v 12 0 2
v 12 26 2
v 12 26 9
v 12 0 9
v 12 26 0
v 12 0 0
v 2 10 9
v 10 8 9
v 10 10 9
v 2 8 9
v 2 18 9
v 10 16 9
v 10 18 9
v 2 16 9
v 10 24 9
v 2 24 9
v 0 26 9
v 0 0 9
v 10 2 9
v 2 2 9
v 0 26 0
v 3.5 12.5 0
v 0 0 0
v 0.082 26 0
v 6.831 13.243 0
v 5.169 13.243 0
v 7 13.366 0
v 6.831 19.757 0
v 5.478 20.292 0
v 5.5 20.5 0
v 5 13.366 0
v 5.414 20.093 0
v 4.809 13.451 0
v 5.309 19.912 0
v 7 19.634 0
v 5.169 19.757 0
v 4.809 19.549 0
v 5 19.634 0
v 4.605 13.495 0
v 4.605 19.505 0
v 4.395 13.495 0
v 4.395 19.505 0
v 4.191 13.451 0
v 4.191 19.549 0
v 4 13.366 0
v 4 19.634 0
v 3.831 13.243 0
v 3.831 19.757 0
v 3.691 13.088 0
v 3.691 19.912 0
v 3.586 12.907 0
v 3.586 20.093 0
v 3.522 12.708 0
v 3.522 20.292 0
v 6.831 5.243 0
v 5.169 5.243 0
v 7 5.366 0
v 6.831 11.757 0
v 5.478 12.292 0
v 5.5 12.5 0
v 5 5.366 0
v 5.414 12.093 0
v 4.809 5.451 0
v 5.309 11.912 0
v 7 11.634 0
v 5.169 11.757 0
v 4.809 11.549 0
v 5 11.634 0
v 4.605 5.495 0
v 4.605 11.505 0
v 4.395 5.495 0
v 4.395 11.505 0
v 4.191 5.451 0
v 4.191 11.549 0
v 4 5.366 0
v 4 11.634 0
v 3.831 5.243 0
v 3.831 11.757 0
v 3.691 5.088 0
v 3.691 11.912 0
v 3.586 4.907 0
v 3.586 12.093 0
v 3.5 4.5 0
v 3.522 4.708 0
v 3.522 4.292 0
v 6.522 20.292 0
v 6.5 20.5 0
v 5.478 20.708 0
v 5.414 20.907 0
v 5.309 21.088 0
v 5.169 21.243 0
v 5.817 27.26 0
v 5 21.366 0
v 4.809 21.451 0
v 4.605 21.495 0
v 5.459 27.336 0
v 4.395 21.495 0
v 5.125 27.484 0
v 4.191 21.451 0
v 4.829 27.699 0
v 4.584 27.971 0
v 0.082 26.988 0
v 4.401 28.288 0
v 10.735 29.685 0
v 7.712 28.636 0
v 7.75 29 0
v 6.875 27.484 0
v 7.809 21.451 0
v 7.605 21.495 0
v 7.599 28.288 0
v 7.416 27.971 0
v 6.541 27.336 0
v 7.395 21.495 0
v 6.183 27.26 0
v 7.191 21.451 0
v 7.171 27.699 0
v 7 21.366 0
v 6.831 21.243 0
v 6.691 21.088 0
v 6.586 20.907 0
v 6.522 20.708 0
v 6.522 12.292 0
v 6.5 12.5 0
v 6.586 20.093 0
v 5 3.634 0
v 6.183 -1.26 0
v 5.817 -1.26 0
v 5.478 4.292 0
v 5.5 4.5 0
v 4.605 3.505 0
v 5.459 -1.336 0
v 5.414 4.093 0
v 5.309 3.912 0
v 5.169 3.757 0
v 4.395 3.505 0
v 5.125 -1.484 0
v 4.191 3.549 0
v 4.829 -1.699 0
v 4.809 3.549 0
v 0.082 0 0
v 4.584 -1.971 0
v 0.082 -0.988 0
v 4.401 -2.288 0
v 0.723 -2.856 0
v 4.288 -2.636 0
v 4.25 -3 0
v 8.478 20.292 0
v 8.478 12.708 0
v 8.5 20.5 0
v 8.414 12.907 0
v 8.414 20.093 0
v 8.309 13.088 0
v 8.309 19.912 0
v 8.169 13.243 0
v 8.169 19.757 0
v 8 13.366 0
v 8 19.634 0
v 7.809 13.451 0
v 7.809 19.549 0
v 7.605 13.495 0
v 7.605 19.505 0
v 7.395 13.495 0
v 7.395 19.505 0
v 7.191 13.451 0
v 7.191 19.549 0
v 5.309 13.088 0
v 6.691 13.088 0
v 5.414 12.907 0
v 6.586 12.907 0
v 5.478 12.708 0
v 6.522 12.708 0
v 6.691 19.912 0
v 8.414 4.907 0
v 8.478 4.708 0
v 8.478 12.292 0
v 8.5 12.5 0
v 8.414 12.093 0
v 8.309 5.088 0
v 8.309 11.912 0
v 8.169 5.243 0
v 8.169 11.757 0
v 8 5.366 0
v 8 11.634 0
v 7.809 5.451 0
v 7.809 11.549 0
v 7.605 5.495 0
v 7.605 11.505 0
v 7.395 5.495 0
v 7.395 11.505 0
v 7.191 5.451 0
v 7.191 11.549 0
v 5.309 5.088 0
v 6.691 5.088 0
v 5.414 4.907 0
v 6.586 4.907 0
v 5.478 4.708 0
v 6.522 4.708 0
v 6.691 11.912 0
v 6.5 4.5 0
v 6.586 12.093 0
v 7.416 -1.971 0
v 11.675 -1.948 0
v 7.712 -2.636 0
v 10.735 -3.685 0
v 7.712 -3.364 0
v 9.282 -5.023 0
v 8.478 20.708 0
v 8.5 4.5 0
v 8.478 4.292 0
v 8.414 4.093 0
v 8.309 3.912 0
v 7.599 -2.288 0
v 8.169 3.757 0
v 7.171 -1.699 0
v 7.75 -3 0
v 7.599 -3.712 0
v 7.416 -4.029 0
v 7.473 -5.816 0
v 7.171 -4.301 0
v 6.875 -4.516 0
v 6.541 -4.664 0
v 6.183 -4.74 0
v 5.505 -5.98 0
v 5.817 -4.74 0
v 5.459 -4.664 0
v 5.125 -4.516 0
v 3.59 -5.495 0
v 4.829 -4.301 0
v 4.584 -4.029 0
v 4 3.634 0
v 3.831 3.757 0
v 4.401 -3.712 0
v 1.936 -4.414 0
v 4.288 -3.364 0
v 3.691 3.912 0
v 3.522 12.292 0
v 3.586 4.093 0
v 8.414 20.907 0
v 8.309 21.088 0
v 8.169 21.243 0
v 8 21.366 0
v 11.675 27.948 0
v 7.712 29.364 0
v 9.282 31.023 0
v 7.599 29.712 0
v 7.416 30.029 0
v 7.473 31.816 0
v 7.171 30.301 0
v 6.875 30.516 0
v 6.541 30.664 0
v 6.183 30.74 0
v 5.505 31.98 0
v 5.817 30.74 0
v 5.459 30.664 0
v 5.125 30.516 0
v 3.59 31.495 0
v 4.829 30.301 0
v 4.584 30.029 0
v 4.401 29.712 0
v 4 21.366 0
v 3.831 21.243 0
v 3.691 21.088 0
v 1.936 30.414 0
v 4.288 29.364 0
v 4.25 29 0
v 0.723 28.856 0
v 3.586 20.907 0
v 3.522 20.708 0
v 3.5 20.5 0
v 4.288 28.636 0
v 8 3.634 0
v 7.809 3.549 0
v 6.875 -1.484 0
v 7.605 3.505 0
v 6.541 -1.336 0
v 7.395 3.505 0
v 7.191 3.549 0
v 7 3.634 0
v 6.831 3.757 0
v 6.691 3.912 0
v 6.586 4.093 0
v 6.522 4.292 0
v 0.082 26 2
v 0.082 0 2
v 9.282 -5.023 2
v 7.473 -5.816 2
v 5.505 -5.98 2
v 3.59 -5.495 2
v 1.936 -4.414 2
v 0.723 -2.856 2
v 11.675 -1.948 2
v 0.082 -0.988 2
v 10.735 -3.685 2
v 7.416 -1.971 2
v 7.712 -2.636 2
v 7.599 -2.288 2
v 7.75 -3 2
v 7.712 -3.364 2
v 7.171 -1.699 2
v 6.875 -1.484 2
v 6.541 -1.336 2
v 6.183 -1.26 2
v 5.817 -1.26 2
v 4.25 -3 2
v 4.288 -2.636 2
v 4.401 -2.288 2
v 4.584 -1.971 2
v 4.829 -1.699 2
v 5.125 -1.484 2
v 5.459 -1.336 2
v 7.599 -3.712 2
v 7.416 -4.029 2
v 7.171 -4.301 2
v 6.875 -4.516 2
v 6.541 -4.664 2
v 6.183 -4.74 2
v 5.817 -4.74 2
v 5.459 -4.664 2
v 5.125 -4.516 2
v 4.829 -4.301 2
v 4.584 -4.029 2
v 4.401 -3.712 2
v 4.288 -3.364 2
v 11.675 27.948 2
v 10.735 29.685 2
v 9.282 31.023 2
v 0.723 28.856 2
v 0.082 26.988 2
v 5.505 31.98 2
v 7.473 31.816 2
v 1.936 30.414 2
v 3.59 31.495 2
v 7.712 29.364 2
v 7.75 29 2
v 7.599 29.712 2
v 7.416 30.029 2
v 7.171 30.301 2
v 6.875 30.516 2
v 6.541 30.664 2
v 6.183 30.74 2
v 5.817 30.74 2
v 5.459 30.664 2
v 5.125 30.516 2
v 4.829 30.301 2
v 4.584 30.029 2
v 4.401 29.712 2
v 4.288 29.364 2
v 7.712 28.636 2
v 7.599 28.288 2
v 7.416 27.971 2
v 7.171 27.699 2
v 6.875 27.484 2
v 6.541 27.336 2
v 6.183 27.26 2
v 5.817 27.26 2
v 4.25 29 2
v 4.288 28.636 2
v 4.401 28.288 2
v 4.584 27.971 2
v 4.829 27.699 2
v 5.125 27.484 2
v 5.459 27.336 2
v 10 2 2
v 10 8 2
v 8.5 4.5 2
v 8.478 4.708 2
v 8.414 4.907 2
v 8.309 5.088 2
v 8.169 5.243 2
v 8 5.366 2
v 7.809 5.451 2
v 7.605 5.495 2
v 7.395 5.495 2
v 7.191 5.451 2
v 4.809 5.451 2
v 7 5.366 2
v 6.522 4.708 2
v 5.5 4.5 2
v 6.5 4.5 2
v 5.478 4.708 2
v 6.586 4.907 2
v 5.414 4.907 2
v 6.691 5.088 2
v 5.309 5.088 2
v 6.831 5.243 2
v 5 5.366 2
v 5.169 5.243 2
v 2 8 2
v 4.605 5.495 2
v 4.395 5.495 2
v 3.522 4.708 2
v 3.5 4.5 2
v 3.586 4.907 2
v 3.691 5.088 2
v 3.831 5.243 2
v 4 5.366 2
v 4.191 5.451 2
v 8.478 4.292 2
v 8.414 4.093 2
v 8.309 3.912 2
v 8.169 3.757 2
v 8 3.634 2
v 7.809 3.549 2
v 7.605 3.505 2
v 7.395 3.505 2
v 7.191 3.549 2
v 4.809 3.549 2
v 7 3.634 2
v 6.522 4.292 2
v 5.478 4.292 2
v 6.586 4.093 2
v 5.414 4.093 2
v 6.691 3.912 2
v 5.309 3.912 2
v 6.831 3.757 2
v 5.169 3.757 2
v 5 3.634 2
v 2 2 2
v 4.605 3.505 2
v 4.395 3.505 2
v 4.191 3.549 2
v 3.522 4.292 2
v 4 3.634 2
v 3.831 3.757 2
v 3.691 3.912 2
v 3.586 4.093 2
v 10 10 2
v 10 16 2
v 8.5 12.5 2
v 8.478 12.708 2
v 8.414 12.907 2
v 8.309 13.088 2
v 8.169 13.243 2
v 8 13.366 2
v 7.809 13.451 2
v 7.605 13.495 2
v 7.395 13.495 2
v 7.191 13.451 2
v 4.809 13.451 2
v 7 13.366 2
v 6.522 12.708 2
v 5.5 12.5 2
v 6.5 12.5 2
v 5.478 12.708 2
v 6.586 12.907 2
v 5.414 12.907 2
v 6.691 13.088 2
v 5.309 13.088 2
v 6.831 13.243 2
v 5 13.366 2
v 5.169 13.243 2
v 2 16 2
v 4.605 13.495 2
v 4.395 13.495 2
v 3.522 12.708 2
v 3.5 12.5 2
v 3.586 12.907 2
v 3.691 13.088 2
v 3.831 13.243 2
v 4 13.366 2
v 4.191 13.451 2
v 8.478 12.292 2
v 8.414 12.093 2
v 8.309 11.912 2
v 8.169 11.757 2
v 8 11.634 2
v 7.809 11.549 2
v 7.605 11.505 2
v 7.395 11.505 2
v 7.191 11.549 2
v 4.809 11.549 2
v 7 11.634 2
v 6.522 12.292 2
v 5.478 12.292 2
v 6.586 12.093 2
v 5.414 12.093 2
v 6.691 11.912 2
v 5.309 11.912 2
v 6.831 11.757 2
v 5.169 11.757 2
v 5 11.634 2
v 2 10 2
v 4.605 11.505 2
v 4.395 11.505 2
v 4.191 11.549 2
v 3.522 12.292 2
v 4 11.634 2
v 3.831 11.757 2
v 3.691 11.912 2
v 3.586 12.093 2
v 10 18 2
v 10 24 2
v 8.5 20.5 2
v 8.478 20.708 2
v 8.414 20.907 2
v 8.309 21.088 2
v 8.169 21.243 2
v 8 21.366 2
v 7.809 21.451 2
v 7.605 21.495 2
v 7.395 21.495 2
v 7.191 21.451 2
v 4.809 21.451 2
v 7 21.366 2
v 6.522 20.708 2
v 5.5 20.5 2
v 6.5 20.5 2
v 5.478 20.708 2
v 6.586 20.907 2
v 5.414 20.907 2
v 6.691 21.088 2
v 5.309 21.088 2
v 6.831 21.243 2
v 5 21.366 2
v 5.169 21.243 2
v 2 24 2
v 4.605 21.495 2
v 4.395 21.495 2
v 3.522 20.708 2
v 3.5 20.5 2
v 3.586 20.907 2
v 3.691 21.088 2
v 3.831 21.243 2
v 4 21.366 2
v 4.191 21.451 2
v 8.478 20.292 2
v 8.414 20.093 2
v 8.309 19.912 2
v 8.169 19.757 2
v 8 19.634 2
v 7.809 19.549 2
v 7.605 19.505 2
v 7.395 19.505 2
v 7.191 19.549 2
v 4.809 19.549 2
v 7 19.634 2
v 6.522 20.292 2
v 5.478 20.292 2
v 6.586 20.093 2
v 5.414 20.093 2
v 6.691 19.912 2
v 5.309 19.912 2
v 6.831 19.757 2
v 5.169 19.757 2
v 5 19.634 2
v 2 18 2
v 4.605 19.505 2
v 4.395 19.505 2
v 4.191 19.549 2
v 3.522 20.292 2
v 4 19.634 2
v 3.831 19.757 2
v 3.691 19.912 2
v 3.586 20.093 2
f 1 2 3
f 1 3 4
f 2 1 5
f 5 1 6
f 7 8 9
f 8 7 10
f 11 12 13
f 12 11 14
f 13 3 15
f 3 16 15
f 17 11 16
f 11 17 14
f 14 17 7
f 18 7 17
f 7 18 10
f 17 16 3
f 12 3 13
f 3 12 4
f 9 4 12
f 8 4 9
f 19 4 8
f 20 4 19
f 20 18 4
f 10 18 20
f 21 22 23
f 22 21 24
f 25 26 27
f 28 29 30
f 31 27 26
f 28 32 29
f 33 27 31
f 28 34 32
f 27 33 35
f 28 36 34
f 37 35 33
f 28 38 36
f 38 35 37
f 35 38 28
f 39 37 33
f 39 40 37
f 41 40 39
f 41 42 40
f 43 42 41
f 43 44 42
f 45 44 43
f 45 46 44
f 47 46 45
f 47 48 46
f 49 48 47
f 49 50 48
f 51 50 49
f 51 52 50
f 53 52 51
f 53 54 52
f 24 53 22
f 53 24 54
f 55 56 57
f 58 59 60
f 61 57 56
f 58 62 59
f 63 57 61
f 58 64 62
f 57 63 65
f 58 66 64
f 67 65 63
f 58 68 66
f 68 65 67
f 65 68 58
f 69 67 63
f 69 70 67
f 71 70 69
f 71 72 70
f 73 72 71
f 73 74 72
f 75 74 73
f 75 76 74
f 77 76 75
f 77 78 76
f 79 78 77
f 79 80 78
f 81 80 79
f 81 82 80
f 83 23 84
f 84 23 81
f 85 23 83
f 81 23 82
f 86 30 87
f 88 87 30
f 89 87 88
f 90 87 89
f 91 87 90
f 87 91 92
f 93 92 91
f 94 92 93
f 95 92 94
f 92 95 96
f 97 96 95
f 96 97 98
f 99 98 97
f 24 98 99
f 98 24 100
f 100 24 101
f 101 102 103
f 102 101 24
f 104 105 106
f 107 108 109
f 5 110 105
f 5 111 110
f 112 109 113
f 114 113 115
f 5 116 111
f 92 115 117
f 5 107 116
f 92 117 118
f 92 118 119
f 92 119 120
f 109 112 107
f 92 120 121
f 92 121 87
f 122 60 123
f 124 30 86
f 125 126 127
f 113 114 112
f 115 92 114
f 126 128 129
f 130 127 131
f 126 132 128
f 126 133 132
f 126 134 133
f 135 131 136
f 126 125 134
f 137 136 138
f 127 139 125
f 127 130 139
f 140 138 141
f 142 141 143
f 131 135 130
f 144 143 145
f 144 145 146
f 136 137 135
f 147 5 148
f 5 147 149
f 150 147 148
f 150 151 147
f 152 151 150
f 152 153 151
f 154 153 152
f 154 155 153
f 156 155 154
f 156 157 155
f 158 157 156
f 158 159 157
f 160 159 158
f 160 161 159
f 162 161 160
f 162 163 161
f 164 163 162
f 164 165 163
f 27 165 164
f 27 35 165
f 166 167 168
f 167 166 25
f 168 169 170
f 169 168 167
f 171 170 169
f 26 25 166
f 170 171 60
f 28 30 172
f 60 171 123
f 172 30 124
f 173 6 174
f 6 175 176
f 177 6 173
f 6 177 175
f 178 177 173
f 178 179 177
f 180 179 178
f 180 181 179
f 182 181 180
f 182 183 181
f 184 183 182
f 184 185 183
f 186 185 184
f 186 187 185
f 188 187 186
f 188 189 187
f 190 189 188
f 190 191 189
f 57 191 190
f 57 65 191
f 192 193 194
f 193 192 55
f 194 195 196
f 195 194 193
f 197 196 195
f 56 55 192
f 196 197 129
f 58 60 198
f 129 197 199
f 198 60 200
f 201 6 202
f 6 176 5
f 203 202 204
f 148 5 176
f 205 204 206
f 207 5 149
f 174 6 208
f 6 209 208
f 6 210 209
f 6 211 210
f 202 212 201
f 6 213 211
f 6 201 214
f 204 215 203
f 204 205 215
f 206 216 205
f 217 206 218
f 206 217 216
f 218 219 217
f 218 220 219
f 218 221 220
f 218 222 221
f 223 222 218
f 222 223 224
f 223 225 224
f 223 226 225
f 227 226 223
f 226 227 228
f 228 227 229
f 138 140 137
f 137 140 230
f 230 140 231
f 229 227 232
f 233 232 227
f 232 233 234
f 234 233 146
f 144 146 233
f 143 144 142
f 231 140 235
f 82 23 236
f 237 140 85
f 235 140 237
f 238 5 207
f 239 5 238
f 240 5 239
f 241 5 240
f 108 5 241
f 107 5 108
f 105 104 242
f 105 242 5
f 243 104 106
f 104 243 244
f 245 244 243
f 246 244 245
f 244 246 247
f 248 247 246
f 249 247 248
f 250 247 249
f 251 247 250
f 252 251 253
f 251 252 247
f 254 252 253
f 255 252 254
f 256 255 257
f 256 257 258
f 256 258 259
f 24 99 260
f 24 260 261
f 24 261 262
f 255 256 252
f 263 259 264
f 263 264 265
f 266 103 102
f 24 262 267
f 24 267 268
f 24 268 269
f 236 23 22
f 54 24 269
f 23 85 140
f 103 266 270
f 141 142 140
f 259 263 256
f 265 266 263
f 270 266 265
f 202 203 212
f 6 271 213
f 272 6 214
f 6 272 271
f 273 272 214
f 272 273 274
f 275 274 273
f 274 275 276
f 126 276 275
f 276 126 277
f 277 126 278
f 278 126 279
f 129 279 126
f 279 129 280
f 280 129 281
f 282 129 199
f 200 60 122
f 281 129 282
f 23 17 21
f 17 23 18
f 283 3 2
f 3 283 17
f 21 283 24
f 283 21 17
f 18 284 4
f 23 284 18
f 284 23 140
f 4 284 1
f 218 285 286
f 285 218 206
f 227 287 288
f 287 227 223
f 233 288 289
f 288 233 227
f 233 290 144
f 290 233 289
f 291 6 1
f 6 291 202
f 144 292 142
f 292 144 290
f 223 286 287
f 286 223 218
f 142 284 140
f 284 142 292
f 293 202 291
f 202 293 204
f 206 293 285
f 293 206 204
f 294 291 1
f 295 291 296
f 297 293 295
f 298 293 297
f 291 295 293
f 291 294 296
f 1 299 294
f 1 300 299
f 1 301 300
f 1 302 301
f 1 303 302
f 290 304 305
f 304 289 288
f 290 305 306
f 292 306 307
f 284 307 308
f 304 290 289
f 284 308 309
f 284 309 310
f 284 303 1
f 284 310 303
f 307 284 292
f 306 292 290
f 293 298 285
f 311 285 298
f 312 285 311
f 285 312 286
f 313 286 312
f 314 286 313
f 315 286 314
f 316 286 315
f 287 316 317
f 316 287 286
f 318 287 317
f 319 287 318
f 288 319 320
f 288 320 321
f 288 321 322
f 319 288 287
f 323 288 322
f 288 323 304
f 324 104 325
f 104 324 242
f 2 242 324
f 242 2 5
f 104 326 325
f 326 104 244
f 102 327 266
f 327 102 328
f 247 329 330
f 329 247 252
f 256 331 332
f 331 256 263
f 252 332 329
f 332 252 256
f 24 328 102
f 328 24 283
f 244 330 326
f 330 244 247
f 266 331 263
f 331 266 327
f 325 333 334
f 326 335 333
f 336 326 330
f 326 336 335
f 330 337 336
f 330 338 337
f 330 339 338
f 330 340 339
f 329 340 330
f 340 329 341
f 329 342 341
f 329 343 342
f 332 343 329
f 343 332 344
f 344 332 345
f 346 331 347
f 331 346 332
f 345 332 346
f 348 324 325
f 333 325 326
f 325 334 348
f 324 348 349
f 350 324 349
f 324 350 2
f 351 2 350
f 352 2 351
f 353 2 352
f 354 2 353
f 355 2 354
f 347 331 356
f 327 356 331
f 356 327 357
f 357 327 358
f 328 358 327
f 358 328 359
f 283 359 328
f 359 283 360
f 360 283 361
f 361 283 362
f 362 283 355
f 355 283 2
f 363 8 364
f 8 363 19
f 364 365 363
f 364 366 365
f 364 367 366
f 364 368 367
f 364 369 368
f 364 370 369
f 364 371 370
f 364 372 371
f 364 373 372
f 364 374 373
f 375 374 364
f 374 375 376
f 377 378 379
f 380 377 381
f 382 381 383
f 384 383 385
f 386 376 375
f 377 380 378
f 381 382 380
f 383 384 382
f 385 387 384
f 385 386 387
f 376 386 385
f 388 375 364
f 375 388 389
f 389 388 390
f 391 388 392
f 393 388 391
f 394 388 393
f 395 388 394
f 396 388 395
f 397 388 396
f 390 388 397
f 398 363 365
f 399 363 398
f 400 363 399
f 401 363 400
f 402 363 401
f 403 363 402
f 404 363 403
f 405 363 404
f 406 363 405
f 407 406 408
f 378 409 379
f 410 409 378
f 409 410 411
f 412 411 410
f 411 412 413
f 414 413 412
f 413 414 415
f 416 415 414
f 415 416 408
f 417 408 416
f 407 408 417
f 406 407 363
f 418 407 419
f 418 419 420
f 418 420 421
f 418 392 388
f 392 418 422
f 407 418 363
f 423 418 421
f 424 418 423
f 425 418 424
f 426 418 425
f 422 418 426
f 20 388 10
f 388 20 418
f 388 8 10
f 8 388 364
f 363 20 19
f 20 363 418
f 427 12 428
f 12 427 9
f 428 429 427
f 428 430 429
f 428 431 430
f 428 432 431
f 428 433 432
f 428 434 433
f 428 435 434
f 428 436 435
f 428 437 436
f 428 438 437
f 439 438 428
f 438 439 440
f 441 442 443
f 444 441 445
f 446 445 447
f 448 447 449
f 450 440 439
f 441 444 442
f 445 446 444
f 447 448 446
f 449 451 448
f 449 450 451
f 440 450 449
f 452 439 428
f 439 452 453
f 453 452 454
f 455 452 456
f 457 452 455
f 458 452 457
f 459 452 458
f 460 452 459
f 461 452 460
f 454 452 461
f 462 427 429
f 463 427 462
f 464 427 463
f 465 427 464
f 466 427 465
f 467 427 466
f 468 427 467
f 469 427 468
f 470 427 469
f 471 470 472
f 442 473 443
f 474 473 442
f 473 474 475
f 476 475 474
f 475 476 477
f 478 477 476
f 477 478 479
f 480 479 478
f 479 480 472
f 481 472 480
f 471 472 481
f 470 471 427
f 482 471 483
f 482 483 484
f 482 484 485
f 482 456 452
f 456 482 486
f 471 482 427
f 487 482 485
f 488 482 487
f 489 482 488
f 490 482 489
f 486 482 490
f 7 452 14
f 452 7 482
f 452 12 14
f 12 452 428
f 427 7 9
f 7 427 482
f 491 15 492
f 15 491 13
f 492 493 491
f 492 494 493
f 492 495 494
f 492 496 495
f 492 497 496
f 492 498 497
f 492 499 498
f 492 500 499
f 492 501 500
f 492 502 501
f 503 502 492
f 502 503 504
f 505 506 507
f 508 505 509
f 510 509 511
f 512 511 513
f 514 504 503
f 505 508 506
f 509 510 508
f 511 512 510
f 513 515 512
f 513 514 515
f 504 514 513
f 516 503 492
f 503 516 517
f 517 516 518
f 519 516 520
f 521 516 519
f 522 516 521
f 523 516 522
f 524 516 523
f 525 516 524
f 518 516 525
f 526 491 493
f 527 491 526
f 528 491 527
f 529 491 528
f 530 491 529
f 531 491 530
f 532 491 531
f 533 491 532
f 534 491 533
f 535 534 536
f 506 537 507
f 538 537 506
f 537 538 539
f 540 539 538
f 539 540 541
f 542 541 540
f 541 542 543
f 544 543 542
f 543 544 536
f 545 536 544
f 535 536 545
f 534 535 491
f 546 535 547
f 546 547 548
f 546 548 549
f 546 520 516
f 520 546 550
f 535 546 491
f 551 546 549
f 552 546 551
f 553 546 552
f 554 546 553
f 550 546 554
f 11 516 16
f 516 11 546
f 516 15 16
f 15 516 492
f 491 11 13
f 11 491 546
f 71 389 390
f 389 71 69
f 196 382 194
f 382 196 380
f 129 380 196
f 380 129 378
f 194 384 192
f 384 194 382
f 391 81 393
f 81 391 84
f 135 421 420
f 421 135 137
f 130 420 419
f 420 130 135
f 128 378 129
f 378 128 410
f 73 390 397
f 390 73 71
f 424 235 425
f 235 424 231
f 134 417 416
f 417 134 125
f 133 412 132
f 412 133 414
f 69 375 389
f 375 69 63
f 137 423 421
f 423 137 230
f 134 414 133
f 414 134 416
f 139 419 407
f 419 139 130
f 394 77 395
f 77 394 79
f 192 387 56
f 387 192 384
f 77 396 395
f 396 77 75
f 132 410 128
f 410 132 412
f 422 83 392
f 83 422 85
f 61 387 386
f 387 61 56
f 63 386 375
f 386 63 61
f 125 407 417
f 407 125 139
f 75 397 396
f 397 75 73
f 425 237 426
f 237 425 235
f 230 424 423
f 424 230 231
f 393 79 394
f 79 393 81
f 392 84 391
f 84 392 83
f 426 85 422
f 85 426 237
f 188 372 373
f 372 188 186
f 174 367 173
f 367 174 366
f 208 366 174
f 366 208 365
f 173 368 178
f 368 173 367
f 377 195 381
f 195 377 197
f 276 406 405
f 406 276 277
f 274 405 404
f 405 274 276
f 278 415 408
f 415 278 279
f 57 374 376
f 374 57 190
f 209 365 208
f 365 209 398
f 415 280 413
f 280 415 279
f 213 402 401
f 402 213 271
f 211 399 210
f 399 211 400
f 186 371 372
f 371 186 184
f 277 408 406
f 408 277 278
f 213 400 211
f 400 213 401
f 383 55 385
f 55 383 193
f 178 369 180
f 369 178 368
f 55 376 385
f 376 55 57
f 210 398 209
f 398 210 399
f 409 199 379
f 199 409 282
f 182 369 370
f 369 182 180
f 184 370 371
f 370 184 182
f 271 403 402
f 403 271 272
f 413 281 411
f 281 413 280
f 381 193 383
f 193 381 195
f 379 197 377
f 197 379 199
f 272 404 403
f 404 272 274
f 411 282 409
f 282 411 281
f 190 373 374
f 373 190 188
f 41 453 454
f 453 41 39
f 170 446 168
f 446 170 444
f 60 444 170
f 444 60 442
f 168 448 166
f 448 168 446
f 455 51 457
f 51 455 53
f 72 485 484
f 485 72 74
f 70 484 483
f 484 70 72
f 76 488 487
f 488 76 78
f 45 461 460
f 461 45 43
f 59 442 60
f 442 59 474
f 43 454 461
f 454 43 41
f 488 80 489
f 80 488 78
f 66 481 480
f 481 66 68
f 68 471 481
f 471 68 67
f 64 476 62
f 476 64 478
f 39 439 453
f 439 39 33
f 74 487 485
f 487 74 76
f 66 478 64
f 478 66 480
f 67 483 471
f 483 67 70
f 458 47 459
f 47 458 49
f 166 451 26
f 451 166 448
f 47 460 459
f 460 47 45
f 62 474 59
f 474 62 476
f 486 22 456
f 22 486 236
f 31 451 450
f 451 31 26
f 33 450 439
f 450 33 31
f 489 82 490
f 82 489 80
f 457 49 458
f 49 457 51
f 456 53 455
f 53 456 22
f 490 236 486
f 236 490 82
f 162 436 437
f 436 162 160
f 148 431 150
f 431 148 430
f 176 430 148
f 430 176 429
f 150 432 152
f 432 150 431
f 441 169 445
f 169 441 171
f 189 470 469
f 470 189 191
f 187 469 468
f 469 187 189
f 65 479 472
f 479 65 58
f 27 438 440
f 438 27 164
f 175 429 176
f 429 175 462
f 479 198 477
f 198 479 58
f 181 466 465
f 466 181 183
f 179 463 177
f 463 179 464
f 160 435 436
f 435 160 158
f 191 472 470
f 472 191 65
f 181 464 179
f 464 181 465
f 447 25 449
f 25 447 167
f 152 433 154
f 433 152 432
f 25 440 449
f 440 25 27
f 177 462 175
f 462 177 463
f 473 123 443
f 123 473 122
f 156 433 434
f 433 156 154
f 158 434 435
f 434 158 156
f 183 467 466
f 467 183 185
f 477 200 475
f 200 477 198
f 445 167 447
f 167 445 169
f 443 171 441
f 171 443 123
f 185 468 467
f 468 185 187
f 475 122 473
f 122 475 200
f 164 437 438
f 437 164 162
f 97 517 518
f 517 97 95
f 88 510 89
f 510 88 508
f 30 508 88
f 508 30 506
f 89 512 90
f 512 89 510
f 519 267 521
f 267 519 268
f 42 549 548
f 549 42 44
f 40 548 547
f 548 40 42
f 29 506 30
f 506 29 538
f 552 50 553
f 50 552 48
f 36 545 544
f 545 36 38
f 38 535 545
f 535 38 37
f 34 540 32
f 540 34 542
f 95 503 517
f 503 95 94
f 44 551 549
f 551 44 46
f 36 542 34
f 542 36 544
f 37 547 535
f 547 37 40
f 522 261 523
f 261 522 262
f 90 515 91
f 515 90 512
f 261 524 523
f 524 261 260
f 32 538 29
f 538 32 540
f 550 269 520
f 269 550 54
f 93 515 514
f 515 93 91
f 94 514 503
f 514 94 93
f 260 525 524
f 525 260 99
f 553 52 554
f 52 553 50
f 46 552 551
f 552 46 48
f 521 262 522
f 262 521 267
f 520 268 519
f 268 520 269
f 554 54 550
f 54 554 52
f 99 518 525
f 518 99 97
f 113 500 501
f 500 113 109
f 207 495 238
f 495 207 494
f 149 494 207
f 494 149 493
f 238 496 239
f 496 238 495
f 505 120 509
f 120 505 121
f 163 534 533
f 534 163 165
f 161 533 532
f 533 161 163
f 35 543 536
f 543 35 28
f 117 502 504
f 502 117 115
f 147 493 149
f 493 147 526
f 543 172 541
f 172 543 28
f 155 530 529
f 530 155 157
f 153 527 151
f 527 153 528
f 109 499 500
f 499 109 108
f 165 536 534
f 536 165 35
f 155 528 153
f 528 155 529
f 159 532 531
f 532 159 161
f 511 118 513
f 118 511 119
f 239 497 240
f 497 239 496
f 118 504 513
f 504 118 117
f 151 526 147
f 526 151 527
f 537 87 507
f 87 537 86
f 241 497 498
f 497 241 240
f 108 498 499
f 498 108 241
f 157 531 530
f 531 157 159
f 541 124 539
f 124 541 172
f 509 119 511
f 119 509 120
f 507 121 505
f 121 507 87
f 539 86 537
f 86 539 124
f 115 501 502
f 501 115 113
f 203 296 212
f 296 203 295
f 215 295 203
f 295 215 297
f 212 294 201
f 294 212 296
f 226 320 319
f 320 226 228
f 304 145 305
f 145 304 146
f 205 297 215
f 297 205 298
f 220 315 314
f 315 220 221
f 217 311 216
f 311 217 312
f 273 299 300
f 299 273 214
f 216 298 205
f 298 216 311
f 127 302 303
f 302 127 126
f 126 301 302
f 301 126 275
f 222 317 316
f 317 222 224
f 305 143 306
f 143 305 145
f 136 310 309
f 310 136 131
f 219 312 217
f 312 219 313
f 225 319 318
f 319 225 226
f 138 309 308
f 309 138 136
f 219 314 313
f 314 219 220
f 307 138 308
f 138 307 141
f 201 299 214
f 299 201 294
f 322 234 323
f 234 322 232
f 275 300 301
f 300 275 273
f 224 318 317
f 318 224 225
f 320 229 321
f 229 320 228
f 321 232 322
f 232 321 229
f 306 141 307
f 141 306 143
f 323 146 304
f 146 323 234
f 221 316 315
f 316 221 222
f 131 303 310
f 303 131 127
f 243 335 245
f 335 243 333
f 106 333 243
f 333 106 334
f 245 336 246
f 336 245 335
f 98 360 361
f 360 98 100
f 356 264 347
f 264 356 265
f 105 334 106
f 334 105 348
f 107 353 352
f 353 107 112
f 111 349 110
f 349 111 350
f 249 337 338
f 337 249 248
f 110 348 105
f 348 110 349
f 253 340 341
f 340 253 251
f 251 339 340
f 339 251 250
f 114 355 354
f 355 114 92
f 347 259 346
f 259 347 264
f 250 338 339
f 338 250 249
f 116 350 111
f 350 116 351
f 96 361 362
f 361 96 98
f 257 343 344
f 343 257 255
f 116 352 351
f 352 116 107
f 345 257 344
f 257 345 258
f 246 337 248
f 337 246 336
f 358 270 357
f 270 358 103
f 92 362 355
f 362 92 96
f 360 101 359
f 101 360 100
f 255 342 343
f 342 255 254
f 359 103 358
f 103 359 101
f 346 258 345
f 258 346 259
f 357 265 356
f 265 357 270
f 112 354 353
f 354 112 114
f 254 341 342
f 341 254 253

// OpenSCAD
difference()
{
    union()
    {
        cube([12,26,9]);
        translate([6,-0,0]) cylinder(2, 6,6);
        translate([6,26,0]) cylinder(2, 6,6);
    }

    translate([2,2,2]) cube([8,6,8]);
    translate([2,10,2]) cube([8,6,8]);
    translate([2,18,2]) cube([8,6,8]);

    translate([4.5,4.5,-1]) cylinder(10, 1,1, $fn=30);    
    translate([12-4.5,4.5,-1]) cylinder(10, 1,1, $fn=30);    
    translate([4.5,4.5+8,-1]) cylinder(10, 1,1, $fn=30);    
    translate([12-4.5,4.5+8,-1]) cylinder(10, 1,1, $fn=30);    
    translate([4.5,4.5+16,-1]) cylinder(10, 1,1, $fn=30);    
    translate([12-4.5,4.5+16,-1]) cylinder(10, 1,1, $fn=30);    

    translate([6, -3, -1]) cylinder(4, 1.75, 1.75, $fn=30);
    translate([6, 29, -1]) cylinder(4, 1.75, 1.75, $fn=30);
}
